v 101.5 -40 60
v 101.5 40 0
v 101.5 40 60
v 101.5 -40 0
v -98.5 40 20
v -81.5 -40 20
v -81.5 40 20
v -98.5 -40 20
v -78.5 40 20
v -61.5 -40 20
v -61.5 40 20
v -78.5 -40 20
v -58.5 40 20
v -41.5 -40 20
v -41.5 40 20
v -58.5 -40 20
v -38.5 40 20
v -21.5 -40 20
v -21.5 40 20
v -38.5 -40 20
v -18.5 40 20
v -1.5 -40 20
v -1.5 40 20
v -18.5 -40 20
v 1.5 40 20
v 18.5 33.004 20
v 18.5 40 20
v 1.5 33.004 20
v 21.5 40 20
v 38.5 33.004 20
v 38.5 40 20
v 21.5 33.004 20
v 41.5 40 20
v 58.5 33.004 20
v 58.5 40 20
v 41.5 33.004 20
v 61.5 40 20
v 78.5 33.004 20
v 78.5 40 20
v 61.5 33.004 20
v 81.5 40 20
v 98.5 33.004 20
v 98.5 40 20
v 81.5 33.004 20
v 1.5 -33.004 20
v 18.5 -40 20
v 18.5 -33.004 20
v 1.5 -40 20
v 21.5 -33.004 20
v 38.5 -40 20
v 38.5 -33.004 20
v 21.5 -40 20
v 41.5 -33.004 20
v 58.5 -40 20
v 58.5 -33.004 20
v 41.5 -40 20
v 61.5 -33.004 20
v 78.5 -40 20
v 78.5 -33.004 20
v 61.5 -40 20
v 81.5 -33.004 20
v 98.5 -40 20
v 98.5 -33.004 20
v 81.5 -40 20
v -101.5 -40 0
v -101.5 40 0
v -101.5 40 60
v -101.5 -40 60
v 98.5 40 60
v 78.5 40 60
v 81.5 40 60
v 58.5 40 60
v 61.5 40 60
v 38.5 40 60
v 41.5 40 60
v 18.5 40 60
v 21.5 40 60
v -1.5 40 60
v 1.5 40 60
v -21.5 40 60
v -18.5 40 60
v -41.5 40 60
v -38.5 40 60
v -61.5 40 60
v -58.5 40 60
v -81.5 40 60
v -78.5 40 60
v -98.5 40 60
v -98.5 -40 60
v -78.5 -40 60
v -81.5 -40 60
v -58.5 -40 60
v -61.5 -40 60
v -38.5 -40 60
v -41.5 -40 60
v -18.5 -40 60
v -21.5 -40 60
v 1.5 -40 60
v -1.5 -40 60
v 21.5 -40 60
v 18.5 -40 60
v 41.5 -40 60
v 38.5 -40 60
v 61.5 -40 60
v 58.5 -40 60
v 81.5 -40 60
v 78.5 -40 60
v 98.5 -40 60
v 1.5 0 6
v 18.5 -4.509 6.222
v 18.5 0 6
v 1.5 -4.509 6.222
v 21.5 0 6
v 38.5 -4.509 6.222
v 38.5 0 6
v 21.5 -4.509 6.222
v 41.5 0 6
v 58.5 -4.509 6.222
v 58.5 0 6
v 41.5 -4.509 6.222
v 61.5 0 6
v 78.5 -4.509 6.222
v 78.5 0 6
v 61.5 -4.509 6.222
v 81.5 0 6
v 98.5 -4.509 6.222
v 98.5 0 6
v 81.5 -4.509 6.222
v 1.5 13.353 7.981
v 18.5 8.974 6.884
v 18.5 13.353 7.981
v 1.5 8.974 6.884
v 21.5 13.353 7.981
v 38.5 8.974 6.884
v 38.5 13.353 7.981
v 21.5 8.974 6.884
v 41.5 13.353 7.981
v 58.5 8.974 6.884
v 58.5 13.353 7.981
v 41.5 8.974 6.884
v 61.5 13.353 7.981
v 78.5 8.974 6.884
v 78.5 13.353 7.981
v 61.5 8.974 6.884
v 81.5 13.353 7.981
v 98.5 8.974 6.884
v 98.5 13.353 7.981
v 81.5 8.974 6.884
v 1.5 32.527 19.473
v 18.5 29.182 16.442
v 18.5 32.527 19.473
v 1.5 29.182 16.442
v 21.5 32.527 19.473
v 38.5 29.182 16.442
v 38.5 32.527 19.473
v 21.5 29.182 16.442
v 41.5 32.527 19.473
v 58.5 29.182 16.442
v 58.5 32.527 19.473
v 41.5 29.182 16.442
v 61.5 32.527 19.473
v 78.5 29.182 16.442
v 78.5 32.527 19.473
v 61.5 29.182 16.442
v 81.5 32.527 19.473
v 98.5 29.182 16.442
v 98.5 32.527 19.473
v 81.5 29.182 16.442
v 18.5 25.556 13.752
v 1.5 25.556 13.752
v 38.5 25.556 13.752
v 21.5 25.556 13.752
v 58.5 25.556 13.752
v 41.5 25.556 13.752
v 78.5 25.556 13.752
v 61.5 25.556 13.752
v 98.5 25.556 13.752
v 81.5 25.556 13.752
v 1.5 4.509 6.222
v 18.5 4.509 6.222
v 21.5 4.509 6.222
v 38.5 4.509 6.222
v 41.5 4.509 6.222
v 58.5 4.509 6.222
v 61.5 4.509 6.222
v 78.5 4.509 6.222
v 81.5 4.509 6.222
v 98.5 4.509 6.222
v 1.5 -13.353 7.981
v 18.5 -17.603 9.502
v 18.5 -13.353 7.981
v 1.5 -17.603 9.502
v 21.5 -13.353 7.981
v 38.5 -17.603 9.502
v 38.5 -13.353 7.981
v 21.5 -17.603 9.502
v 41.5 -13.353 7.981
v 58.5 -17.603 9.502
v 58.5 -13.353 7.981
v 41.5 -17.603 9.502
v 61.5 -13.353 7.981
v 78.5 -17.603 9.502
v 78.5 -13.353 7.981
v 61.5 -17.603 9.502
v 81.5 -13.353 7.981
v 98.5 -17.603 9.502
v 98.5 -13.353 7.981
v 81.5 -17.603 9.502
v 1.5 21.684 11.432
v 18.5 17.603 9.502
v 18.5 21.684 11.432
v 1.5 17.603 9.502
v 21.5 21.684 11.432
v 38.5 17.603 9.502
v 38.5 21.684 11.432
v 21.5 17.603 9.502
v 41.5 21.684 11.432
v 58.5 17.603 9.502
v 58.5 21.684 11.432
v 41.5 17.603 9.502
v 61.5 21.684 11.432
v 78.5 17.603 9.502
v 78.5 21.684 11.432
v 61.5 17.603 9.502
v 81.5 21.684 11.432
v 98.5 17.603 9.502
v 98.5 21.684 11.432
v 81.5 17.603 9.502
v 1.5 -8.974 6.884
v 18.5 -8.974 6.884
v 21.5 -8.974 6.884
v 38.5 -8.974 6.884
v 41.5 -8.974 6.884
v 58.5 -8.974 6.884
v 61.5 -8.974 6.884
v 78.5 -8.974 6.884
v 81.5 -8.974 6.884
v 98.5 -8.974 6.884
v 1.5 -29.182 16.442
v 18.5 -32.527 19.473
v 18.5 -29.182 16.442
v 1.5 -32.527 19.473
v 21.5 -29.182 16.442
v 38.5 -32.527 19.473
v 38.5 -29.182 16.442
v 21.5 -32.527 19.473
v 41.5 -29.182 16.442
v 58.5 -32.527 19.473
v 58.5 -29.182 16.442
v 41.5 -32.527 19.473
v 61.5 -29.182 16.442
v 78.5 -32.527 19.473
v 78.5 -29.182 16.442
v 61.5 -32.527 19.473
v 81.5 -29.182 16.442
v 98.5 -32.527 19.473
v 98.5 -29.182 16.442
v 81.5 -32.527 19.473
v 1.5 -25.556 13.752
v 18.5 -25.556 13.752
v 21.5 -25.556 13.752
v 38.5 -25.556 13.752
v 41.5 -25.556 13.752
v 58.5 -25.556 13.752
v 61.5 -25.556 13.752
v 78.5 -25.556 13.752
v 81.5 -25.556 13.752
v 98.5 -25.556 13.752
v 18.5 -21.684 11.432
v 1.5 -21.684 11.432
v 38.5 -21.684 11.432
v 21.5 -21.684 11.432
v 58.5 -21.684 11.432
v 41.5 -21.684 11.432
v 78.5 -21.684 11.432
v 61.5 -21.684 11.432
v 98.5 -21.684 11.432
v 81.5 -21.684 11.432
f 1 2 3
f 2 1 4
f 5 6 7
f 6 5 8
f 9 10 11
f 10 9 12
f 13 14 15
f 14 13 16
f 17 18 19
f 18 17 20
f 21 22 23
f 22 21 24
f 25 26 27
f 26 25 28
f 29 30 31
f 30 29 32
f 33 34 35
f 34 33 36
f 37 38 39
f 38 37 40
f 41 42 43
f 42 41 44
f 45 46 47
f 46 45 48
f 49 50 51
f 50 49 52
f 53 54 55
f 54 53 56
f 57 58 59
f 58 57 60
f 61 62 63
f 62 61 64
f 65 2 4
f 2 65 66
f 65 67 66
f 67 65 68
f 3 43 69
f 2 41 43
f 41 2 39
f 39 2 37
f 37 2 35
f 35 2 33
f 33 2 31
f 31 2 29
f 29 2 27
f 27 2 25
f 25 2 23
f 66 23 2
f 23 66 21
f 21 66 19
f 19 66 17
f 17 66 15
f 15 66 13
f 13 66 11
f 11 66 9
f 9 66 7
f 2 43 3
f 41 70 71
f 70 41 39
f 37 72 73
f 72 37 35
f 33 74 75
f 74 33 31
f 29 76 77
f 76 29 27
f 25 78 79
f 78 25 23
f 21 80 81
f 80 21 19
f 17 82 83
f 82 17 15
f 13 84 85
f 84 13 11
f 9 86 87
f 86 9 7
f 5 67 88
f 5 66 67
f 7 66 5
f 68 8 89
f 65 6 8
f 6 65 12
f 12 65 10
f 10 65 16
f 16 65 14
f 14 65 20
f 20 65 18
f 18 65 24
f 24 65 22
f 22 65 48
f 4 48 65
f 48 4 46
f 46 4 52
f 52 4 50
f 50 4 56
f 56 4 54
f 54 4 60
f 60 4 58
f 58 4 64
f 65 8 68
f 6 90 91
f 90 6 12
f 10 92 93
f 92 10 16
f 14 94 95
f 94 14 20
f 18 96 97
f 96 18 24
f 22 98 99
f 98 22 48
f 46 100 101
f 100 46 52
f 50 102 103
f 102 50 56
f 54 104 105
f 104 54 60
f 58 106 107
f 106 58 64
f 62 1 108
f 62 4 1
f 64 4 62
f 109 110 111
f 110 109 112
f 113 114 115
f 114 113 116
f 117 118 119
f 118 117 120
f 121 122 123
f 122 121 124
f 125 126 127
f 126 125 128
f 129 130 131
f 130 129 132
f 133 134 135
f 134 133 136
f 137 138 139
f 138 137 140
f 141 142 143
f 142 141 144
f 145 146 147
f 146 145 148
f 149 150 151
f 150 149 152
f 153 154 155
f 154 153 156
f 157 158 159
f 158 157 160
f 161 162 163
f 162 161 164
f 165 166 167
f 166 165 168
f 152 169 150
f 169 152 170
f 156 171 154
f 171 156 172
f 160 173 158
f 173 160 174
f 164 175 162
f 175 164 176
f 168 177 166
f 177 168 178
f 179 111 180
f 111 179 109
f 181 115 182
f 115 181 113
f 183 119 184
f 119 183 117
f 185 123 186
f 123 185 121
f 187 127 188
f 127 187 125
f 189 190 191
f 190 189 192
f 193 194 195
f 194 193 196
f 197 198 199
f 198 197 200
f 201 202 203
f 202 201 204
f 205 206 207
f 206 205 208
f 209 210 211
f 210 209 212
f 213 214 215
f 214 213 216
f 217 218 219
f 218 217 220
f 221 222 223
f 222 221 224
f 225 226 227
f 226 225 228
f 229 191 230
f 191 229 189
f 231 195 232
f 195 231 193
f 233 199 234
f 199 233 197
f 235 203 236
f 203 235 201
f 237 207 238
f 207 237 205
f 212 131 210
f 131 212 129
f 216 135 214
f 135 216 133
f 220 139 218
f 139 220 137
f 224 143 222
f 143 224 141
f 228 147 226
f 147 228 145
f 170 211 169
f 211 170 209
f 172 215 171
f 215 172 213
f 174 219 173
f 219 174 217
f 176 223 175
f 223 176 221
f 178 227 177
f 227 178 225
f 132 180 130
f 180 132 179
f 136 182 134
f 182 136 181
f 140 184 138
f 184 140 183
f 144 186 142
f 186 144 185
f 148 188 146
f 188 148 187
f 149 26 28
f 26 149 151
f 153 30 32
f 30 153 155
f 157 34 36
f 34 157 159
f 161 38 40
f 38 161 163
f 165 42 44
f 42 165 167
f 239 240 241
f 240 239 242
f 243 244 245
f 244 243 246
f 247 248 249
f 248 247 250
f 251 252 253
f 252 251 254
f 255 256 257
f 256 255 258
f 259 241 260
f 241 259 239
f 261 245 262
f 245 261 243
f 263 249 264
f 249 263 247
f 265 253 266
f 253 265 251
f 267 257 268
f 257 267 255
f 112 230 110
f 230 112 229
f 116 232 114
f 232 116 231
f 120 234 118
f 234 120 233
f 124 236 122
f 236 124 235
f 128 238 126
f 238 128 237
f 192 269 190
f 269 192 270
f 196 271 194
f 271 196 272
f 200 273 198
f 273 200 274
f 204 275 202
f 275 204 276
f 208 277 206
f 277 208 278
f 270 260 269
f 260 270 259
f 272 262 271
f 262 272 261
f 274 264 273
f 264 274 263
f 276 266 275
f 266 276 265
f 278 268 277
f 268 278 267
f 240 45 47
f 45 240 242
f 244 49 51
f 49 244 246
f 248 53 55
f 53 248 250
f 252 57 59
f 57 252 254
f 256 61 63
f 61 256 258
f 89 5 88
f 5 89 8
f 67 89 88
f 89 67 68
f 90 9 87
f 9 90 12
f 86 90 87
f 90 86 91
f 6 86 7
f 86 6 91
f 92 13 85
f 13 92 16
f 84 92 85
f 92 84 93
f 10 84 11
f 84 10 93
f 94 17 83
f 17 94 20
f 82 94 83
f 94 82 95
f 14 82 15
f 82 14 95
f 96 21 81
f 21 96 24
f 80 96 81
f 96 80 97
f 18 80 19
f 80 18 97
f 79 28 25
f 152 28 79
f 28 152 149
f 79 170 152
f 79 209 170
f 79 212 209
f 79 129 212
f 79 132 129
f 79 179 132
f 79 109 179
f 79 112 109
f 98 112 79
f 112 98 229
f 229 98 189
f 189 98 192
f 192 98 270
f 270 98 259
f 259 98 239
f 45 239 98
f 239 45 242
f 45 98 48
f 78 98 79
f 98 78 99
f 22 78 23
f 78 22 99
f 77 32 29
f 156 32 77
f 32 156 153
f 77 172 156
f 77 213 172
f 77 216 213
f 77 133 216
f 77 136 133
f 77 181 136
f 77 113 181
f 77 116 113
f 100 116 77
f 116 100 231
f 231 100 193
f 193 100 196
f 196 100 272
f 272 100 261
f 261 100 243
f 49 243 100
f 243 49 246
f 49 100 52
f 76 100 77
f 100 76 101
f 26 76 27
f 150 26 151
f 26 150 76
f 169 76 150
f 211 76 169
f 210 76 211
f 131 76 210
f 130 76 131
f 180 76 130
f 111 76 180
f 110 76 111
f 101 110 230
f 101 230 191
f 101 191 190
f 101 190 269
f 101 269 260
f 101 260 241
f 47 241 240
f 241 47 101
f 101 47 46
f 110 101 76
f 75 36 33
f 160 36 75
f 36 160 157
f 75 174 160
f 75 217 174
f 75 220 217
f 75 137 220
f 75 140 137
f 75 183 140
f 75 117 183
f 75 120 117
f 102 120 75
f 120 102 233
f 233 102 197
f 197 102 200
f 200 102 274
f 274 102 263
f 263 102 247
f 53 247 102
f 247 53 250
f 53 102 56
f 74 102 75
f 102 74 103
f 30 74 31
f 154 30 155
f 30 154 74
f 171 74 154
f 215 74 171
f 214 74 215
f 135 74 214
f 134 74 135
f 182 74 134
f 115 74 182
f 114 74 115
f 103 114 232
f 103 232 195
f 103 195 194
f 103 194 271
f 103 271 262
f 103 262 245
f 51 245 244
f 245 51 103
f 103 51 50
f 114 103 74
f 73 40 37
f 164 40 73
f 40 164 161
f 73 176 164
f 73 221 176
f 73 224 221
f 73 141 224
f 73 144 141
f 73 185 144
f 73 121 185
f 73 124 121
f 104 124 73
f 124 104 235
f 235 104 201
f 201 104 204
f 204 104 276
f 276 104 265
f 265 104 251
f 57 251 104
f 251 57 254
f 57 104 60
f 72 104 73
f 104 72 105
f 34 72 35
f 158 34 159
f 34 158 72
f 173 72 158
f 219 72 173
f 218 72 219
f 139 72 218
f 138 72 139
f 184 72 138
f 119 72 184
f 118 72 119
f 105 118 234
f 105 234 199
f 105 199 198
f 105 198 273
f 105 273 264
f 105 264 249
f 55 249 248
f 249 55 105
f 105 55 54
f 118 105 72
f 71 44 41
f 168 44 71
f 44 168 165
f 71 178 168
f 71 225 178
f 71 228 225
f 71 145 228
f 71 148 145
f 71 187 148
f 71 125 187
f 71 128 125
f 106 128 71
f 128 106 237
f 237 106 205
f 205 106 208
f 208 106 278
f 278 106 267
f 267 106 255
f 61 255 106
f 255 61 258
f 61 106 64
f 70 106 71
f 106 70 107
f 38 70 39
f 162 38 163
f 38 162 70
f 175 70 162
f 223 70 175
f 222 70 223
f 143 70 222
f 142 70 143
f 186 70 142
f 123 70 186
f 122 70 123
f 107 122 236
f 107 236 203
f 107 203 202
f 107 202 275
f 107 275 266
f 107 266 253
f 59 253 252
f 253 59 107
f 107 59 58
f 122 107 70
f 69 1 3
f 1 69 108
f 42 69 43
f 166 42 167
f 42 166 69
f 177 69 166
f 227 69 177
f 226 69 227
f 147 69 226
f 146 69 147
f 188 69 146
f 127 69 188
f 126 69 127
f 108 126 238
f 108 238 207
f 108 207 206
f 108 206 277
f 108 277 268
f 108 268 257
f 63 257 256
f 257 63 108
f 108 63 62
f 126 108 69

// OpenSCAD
// Petri Dish Rack for 10 dishes (90mm diameter)
// Corrected to ensure base is at Z=0 and cradle is cut into the base.

// --- Dimensions ---
base_length = 203;          // X dimension of the base
base_width = 80;            // Y dimension of the base
base_height = 20;           // Z dimension of the base

dish_radius = 45;           // Radius of 90mm dish
cradle_radius = 46;         // Radius of the cutting cylinder
cradle_z_offset = 52;       // Z-coordinate of the cylinder axis
// Note: Cradle bottom is at 52 - 46 = 6mm. Since base is 20mm, it cuts into the base.

num_dividers = 11;          // Number of solid divider plates
divider_thickness = 3;      // Thickness of each divider (X)
divider_height = 60;        // Height of dividers (Z)
divider_spacing_x = 20;     // Distance between divider centers (X)

// --- Constants ---
$fn = 64;

// --- Implementation ---

// The goal is to have a base with a groove, and dividers rising from Z=0.
// The dividers must NOT be cut by the cradle.
// The dividers must be part of the same solid or at least touch the bed at Z=0.

union() {
    // 1. The Base with the Cradle Cut
    // We use difference to cut the cylinder out of the base block.
    difference() {
        // The Base Block
        translate([-base_length/2, -base_width/2, 0])
            cube([base_length, base_width, base_height]);
        
        // The Cradle Cut
        // The cylinder axis is at Y=0, Z=52, running along X.
        // We translate the cylinder so its axis is at the correct Z.
        // Since cylinder is created on Z axis, we rotate it to X axis.
        translate([0, 0, cradle_z_offset])
        rotate([0, 90, 0])
            // We extend the cylinder length to ensure a clean cut through the base
            cylinder(h = base_length + 2, r = cradle_radius);
    }

    // 2. The Dividers
    // These rise from Z=0 to Z=60. 
    // Because they are in a union() with the base, they will be solid.
    // Because the cradle was subtracted from the base ONLY, the dividers remain solid.
    for (i = [0 : num_dividers - 1]) {
        // X positions: -100, -80, ..., 100
        x_pos = -100 + (i * divider_spacing_x);
        
        translate([x_pos - divider_thickness/2, -base_width/2, 0])
            cube([divider_thickness, base_width, divider_height]);
    }
}

// Verification of logic:
// - Base is at Z=0.
// - Dividers are at Z=0.
// - Cradle is subtracted from the base block, but since the dividers are 
//   added via union() AFTER the subtraction (or in a separate branch of the union),
//   the dividers remain solid and are not cut by the cylinder.
// - The cradle bottom is at Z = 52 - 46 = 6mm.
// - The base is 20mm tall. Thus, the cradle cuts a groove into the base.
